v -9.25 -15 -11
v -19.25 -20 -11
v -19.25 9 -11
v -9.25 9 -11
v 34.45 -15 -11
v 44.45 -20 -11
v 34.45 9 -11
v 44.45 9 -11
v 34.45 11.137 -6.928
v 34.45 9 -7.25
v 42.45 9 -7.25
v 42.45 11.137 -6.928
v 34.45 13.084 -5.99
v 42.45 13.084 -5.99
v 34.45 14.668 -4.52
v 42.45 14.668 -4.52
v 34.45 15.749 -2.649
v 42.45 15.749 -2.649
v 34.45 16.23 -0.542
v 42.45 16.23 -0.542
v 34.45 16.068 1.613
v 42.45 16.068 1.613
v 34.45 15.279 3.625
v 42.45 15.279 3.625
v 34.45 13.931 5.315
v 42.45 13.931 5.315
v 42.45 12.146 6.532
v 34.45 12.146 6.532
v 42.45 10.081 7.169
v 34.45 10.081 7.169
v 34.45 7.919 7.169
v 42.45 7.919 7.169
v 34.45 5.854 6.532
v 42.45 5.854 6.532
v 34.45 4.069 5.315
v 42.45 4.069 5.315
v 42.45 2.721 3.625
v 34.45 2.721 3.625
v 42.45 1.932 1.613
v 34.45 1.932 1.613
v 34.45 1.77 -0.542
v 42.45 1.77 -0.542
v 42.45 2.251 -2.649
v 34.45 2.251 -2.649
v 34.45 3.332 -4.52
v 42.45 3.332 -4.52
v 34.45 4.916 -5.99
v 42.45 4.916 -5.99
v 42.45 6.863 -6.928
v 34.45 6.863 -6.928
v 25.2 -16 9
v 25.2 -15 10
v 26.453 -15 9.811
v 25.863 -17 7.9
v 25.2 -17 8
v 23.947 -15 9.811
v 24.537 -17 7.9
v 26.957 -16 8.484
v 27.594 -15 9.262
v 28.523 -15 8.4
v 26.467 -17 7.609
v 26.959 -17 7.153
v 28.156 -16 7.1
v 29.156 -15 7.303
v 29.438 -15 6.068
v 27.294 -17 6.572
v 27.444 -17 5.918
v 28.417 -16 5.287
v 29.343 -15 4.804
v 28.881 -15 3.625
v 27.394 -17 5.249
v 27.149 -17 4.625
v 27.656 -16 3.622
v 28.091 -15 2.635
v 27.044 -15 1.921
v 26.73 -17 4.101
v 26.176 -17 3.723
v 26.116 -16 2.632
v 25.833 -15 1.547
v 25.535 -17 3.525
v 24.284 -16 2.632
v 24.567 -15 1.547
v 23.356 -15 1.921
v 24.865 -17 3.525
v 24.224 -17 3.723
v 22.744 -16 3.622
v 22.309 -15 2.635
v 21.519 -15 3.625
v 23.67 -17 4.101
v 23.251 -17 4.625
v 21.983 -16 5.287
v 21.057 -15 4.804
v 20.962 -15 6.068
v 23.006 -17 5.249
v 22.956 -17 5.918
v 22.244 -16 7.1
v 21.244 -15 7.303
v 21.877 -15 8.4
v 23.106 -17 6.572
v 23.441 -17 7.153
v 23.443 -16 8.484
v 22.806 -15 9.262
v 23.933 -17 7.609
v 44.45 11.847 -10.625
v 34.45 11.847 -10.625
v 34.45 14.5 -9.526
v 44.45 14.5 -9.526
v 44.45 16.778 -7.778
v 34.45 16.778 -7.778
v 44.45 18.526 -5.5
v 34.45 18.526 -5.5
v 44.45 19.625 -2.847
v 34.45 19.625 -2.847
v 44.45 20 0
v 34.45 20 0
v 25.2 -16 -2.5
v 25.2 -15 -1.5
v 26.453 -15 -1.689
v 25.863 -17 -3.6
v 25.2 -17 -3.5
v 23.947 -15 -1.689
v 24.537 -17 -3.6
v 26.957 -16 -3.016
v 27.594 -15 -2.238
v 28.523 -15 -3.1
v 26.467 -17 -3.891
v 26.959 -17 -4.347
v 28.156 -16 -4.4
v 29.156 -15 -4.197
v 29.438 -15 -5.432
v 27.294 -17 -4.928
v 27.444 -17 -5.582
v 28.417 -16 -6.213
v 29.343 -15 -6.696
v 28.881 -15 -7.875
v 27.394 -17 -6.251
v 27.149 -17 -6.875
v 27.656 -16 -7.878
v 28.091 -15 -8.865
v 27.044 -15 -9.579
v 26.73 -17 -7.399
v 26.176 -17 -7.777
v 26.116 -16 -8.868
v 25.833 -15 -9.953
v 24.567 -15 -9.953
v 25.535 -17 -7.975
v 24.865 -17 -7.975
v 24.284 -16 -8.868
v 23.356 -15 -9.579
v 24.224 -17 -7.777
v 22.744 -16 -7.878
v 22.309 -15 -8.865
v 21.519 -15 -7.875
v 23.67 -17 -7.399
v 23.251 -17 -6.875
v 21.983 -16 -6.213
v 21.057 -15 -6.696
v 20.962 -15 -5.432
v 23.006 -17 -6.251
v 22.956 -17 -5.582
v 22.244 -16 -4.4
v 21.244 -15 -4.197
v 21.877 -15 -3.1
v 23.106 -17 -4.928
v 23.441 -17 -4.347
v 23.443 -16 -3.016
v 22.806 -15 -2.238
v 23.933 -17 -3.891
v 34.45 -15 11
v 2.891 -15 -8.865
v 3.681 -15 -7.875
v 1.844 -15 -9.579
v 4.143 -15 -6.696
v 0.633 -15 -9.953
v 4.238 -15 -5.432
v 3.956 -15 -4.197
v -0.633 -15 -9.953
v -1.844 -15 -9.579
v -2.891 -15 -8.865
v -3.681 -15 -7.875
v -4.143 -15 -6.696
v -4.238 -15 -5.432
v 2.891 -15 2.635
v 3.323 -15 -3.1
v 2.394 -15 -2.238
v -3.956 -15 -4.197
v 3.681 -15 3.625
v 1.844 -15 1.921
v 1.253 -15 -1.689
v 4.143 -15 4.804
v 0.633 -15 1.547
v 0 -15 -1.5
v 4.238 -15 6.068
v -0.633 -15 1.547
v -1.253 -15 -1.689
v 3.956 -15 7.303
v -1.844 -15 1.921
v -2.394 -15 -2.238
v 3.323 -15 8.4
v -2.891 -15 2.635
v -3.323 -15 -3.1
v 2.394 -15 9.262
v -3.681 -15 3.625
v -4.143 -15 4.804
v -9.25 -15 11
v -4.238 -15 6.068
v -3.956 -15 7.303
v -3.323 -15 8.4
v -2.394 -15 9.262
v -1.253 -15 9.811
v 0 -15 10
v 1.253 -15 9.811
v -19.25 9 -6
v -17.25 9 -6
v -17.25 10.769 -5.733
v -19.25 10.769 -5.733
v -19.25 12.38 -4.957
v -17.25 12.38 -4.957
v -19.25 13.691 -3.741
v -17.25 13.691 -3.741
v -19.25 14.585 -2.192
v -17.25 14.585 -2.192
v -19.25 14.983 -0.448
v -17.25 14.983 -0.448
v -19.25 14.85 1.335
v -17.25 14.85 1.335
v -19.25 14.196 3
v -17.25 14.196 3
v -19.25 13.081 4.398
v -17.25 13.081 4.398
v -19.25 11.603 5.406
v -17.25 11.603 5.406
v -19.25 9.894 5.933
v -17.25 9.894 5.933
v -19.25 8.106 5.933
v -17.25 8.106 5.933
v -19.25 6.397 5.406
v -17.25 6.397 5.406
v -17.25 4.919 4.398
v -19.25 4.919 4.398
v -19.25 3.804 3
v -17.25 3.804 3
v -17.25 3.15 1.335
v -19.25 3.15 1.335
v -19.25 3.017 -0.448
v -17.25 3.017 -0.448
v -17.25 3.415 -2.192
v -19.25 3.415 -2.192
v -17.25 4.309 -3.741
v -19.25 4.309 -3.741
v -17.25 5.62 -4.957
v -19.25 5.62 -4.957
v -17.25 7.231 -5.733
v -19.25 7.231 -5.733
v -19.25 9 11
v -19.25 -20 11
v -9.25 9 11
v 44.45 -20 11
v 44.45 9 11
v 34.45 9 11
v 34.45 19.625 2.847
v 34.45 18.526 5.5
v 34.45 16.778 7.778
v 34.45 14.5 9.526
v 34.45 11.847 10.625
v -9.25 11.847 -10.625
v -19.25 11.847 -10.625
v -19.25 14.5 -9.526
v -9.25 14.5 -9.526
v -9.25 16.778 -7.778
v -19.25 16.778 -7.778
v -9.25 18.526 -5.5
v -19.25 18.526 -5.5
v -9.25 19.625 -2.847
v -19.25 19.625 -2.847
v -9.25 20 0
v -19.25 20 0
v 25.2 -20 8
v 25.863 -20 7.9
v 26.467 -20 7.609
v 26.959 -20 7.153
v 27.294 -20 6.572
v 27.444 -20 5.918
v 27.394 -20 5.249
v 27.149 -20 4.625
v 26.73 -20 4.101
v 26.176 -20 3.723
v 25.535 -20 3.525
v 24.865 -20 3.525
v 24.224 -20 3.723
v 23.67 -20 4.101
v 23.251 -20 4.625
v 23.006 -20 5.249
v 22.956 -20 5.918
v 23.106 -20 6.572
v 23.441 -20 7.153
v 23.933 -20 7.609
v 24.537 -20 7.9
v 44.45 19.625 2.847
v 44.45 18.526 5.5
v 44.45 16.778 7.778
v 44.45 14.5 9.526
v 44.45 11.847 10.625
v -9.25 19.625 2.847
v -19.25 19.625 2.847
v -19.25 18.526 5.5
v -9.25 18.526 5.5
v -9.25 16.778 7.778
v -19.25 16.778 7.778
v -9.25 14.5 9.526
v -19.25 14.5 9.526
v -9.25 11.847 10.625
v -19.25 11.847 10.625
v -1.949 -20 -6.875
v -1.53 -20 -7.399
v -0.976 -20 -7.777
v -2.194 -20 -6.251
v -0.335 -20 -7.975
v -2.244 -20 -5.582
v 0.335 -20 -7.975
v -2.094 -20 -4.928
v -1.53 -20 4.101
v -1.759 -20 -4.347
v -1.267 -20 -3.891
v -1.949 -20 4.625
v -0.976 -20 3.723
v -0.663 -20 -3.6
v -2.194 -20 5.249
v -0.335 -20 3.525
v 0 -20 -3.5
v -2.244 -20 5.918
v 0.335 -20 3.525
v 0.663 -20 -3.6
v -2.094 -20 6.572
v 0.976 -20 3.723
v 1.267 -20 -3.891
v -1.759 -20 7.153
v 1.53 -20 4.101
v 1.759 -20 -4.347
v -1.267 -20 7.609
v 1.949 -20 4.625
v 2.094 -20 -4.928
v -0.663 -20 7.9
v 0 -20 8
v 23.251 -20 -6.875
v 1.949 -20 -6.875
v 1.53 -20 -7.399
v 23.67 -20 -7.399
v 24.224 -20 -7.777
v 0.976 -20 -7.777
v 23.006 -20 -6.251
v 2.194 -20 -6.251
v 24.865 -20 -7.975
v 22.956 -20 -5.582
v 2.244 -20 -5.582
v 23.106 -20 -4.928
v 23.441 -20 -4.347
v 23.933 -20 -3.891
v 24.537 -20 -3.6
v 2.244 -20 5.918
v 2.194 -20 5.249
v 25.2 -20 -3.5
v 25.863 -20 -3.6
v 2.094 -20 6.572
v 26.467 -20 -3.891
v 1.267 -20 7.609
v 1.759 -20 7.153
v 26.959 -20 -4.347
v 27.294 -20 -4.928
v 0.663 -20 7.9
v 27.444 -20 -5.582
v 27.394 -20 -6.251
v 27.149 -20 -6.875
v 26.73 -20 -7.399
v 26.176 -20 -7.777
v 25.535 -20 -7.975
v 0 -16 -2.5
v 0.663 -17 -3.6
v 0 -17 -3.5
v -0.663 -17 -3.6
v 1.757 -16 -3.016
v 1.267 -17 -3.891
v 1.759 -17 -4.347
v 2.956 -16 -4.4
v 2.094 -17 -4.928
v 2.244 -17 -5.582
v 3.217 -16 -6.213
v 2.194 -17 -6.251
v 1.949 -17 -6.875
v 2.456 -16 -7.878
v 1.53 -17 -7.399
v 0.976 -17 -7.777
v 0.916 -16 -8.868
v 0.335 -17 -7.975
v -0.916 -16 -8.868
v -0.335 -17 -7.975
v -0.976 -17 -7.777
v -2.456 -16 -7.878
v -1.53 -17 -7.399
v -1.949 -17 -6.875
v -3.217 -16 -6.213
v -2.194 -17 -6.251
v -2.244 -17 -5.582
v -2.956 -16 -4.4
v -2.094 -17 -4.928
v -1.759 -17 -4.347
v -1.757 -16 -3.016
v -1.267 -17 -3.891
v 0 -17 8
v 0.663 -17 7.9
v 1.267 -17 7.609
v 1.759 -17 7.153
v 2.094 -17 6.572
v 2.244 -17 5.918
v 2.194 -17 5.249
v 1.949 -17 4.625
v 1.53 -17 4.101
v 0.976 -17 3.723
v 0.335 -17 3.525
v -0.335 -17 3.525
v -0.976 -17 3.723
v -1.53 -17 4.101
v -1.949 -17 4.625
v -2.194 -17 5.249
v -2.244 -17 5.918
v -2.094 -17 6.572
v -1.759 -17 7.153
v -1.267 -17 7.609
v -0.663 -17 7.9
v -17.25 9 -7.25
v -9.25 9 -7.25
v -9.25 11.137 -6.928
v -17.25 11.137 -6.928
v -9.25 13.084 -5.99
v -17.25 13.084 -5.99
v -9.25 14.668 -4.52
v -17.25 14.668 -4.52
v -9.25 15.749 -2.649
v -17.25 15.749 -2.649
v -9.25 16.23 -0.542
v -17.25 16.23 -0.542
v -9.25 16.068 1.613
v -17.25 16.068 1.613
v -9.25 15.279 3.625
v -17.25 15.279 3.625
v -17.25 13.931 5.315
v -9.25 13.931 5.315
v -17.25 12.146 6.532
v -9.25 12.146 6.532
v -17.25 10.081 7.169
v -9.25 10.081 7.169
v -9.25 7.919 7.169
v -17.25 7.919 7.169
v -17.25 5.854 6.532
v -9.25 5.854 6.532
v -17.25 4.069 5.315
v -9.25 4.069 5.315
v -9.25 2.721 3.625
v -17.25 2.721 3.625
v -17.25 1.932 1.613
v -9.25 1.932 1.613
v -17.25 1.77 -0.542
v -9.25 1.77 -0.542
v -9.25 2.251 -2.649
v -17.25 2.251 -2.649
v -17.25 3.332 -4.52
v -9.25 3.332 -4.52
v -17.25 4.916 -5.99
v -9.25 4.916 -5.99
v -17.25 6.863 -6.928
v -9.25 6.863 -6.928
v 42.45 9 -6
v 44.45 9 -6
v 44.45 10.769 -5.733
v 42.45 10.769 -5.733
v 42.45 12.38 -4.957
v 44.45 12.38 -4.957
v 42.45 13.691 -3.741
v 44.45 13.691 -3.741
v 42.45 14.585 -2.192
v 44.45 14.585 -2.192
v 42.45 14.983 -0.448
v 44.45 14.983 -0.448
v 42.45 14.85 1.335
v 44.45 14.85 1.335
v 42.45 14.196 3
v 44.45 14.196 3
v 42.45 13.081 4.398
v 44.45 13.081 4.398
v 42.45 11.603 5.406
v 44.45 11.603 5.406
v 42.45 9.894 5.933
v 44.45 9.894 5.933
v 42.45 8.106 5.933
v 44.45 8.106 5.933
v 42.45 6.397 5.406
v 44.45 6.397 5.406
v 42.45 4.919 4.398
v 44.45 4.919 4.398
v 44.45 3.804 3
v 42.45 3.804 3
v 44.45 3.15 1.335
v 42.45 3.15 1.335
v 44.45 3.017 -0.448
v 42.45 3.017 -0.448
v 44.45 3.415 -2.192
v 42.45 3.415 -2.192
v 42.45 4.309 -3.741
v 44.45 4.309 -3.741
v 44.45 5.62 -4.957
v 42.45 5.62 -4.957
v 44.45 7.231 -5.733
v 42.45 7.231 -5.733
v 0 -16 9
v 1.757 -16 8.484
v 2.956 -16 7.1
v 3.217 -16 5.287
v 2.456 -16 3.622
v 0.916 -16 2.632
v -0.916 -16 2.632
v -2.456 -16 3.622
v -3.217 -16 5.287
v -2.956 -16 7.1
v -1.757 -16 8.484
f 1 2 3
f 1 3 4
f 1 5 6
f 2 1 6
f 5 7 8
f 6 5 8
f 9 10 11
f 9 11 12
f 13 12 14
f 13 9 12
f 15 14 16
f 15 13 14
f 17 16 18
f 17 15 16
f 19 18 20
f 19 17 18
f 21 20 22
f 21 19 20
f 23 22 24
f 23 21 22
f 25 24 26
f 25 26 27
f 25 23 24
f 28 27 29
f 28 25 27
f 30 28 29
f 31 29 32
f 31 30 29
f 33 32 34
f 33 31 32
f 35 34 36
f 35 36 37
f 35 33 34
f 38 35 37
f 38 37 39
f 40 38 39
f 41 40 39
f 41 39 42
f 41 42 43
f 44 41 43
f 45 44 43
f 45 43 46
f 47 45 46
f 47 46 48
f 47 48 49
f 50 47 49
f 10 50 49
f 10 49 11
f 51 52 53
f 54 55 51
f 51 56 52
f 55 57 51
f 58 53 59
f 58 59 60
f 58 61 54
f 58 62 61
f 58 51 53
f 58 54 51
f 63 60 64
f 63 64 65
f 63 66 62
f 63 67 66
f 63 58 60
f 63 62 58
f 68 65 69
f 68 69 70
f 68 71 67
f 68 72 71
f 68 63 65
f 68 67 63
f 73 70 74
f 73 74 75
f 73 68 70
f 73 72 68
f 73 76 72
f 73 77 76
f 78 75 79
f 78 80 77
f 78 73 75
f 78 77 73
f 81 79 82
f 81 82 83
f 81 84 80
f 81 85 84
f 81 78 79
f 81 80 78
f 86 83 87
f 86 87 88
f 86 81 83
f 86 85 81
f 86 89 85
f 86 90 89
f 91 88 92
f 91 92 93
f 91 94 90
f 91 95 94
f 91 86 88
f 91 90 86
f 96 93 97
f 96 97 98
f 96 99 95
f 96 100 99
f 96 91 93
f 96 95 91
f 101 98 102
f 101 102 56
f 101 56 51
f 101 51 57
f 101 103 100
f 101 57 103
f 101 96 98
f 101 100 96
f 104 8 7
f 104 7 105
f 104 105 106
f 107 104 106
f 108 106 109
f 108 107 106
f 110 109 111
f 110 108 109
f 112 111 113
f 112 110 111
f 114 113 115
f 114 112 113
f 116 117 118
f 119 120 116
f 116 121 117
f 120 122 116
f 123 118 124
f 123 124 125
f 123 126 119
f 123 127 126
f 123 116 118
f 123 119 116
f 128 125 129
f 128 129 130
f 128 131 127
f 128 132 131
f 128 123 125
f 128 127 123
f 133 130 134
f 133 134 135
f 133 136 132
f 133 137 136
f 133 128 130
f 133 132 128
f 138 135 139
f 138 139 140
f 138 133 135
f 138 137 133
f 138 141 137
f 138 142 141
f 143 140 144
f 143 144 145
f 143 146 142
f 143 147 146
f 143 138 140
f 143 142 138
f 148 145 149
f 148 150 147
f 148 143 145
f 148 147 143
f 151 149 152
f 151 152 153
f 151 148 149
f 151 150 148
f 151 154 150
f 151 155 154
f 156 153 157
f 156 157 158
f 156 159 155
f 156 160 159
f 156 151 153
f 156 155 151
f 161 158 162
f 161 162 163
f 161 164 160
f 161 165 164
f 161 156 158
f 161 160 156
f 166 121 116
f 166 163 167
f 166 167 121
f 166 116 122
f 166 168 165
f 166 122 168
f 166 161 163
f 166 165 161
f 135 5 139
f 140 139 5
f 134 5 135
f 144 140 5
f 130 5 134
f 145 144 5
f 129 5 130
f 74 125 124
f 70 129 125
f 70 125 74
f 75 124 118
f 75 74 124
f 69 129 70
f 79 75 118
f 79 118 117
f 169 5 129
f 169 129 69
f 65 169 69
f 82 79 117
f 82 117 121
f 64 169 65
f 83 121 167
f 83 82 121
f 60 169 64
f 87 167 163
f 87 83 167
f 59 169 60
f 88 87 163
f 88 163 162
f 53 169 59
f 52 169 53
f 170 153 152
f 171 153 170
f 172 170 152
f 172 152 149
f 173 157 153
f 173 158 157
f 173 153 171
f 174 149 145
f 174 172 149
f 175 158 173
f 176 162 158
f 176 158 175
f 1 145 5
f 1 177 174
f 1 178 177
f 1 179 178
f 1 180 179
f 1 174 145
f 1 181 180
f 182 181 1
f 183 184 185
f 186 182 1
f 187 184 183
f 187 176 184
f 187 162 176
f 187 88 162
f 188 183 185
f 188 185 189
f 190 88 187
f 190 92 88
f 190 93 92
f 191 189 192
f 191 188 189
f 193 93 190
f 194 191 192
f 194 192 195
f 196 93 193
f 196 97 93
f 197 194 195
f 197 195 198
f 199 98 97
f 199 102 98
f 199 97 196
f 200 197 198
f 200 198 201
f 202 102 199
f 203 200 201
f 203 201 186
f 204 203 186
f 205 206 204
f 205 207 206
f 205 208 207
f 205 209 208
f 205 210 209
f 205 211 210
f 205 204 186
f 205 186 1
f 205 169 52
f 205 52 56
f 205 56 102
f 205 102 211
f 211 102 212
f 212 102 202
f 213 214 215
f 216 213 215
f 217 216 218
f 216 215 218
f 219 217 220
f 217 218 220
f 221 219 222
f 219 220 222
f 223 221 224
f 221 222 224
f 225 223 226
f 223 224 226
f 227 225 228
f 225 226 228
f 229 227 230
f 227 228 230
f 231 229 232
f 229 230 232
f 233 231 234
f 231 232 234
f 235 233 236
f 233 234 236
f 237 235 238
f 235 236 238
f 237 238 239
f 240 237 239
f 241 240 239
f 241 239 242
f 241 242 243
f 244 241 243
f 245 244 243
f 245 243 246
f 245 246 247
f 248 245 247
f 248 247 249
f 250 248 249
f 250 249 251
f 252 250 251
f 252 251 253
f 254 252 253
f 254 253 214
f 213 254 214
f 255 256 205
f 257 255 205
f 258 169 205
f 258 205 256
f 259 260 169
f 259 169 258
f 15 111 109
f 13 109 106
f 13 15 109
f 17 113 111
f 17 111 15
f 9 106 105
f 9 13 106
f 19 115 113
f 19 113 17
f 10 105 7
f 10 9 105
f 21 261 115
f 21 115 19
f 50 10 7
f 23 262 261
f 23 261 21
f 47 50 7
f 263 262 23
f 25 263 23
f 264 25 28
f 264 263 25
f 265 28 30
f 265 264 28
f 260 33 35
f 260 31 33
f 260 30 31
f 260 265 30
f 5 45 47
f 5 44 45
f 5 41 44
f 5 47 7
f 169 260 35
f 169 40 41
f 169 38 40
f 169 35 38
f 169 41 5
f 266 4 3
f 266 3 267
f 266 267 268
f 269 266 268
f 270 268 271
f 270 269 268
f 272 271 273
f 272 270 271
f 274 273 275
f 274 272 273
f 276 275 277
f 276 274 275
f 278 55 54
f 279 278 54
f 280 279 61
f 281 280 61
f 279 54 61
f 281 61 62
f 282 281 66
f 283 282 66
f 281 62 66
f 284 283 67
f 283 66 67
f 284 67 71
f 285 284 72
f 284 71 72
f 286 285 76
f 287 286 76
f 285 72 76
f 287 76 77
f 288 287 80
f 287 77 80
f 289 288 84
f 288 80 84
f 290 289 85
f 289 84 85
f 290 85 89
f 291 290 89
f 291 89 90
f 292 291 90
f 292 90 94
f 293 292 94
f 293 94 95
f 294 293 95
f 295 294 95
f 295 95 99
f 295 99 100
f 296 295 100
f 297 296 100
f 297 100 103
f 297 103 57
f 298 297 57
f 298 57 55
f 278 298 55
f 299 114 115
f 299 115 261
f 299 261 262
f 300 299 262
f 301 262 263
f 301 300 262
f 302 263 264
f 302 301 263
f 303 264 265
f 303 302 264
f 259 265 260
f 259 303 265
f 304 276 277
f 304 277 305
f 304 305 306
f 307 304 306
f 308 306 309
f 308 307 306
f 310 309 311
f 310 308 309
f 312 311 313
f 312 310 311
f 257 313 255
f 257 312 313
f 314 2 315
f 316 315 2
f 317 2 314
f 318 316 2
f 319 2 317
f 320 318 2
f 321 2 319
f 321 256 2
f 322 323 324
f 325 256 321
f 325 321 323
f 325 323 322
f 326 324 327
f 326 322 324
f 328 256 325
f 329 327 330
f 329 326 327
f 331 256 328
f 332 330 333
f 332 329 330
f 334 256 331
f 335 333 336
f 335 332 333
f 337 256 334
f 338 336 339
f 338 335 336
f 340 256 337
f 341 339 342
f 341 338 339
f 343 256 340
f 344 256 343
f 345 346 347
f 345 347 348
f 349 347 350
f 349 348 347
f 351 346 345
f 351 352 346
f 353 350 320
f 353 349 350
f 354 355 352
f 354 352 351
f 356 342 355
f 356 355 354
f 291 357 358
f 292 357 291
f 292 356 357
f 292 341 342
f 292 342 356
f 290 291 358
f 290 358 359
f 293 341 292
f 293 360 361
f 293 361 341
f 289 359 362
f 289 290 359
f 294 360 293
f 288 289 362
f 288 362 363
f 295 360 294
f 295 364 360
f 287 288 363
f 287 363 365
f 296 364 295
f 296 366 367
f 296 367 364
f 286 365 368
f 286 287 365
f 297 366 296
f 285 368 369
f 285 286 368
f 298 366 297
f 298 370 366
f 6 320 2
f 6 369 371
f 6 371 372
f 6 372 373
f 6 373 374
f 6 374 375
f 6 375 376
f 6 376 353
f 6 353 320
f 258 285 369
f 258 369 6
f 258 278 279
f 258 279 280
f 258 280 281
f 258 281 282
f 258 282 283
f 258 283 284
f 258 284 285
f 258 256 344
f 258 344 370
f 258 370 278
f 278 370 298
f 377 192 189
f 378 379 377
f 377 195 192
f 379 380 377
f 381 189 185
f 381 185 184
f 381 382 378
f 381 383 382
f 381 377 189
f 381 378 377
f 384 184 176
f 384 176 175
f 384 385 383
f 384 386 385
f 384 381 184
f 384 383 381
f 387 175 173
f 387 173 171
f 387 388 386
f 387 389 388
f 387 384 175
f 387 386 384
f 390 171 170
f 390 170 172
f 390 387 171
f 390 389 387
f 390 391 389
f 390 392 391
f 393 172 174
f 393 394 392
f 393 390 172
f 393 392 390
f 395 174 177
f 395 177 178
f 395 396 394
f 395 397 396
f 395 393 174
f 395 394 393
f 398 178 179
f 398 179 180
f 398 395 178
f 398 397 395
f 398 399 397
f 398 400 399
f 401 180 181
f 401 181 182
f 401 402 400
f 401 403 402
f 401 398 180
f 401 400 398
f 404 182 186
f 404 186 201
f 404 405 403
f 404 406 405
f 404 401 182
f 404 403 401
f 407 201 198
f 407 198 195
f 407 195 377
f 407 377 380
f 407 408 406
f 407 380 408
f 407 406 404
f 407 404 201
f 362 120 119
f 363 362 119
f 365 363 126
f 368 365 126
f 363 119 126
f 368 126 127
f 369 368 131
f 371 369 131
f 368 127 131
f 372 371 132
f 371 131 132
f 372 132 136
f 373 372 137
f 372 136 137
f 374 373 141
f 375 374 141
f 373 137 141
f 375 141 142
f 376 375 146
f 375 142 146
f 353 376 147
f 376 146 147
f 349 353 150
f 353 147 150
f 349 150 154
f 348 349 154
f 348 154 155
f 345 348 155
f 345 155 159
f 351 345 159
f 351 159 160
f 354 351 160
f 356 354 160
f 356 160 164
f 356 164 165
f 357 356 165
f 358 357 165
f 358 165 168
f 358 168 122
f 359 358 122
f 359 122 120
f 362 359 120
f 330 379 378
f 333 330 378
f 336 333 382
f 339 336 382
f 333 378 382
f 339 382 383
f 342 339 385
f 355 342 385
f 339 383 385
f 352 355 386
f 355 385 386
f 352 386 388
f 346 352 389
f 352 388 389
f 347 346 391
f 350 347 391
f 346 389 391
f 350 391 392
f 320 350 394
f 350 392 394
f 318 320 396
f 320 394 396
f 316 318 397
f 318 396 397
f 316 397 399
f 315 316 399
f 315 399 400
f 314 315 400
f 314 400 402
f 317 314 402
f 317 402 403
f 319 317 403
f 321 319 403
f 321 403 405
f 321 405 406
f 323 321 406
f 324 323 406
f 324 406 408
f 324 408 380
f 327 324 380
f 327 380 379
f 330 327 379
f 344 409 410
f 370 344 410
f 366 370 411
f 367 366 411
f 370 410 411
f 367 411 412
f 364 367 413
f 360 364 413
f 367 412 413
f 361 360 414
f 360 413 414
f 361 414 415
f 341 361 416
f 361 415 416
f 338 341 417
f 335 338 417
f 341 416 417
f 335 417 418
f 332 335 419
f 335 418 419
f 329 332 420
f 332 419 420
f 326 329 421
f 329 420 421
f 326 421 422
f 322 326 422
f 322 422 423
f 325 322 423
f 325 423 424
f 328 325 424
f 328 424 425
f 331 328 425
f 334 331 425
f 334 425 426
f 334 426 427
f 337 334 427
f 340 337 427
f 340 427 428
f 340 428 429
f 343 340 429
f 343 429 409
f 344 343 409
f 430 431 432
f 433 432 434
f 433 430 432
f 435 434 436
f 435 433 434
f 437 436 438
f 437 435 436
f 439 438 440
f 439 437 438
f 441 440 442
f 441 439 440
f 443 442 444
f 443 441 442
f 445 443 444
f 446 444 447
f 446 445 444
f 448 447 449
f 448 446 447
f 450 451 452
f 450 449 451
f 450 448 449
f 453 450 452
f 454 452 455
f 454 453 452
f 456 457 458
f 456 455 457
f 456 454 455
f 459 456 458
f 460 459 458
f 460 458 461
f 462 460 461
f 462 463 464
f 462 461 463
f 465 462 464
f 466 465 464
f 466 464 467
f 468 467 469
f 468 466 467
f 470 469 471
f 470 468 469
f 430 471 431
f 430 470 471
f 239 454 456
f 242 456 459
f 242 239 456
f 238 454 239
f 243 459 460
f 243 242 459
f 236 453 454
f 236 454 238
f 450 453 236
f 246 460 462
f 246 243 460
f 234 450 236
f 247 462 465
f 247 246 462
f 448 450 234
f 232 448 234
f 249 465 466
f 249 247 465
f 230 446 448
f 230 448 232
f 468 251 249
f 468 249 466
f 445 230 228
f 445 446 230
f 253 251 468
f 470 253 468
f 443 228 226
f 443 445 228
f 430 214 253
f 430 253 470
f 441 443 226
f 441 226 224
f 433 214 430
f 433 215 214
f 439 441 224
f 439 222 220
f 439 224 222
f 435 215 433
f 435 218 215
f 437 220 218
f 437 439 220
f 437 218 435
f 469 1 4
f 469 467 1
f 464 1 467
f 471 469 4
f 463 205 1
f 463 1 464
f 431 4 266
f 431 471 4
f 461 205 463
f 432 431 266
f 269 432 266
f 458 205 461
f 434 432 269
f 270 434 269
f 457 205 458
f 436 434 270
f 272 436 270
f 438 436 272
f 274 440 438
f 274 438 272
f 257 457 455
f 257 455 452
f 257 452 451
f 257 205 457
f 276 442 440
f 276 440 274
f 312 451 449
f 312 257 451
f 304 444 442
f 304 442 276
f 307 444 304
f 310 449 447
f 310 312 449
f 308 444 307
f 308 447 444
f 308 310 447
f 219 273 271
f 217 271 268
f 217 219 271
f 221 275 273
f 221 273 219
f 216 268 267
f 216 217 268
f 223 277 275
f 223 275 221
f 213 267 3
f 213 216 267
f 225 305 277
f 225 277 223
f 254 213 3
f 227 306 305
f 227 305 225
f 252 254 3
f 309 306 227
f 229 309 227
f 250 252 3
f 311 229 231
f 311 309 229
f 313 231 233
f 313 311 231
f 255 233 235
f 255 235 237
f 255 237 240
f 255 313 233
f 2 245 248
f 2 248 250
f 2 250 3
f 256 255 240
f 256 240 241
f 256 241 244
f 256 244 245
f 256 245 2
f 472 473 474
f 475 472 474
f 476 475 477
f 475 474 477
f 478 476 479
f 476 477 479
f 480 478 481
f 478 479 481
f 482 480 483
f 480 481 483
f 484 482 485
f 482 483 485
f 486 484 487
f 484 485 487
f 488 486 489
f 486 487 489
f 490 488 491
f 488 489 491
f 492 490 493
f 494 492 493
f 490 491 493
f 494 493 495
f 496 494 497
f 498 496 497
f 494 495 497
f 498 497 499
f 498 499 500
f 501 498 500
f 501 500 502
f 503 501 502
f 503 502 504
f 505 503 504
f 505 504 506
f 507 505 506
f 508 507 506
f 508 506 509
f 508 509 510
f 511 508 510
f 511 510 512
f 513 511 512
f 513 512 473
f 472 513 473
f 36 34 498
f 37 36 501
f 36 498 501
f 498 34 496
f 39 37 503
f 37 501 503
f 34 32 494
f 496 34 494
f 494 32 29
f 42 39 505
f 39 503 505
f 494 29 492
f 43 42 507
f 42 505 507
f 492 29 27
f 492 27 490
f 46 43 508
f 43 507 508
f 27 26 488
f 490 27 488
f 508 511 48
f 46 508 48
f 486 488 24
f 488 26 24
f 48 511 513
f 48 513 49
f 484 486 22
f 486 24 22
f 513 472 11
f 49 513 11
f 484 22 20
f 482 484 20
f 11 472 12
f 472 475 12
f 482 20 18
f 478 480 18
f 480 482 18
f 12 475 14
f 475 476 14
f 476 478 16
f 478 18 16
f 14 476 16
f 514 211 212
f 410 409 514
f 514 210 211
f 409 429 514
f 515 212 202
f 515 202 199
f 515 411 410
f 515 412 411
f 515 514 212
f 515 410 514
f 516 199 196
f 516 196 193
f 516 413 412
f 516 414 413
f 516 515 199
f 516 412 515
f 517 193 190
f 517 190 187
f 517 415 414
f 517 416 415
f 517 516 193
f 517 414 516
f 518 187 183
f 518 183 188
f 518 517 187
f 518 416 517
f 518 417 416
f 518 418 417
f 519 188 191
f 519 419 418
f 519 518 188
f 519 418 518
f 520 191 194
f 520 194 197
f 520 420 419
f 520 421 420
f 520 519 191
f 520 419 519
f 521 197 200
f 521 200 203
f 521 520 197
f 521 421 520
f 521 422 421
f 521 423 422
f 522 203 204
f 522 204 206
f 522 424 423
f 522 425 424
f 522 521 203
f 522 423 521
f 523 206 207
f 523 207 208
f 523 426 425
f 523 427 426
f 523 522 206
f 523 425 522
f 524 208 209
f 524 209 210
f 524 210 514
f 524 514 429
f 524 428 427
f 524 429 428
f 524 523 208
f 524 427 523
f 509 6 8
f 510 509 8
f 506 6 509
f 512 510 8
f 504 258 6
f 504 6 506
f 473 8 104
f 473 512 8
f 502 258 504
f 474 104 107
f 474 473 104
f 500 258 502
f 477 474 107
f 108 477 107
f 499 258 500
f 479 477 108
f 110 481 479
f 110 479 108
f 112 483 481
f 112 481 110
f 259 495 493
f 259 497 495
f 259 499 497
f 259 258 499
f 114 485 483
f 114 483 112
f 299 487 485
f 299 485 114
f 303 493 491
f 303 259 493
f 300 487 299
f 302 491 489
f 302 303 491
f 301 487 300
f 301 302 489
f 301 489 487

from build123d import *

# Parameters (mm, degrees)
BOSS_EXTRUDE1_DEPTH = 11
SKETCH2_R           = 6
CUT_EXTRUDE1_DEPTH  = 68.666018059
SKETCH3_R           = 2.25
CUT_EXTRUDE2_DEPTH  = 58.635080463
CHAMFER1_SIZE       = 2
CUT_EXTRUDE3_START  = -61.7
SKETCH4_R           = 7.25
CUT_EXTRUDE3_DEPTH  = 59.7


with BuildPart() as part:
    # Sketch1 → Boss-Extrude1 (new, symmetric)
    with BuildSketch(Plane.XY):
        Polygon((-19.25, 20), (-19.25, -20), (44.45, -20), (44.45, 20), (34.45, 20), (34.45, -15), (-9.25, -15), (-9.25, 20), align=None)
    extrude(amount=BOSS_EXTRUDE1_DEPTH, both=True)

    # Sketch2 → Cut-Extrude1 (cut, through all)
    with BuildSketch(Plane(origin=(44.45, 0, 0), x_dir=(0, 0, -1), z_dir=(1, 0, 0))):
        with Locations((0, 9)):
            Circle(SKETCH2_R)
        with BuildLine():
            Line((-11, 9), (-11, 20))
            Line((-11, 20), (-11, 31))
            Line((-11, 31), (11, 31))
            Line((11, 31), (11, 20))
            Line((11, 20), (11, 9))
            ThreePointArc((11, 9), (7.778174593, 16.778174593), (0, 20))
            ThreePointArc((0, 20), (-7.778174593, 16.778174593), (-11, 9))
        make_face()
    extrude(amount=-CUT_EXTRUDE1_DEPTH, mode=Mode.SUBTRACT)

    # Sketch3 → Cut-Extrude2 (cut, through all)
    with BuildSketch(Plane(origin=(0, -15, 0), x_dir=(1, 0, 0), z_dir=(0, 1, 0))):
        with Locations(Location((0, 5.75, 0), (0, 0, 270))):
            Circle(SKETCH3_R)
        with Locations(Location((0, -5.75, 0), (0, 0, 270))):
            Circle(SKETCH3_R)
        with Locations(Location((25.2, 5.75, 0), (0, 0, 270))):
            Circle(SKETCH3_R)
        with Locations(Location((25.2, -5.75, 0), (0, 0, 270))):
            Circle(SKETCH3_R)
    extrude(amount=-CUT_EXTRUDE2_DEPTH, mode=Mode.SUBTRACT)

    # Chamfer1
    chamfer1_edges = [part.edges().sort_by_distance(p)[0] for p in [
        (0, -15, 3.5),
        (25.2, -15, -8),
        (25.2, -15, 3.5),
        (0, -15, -8),
    ]]
    chamfer(chamfer1_edges, length=CHAMFER1_SIZE)

    # Sketch4 → Cut-Extrude3 (cut)
    with BuildSketch(Plane(origin=(44.45, 0, 0), x_dir=(0, 0, -1), z_dir=(1, 0, 0)).offset(CUT_EXTRUDE3_START)):
        with Locations((0, 9)):
            Circle(SKETCH4_R)
    extrude(amount=CUT_EXTRUDE3_DEPTH, mode=Mode.SUBTRACT)


solid = part.part
